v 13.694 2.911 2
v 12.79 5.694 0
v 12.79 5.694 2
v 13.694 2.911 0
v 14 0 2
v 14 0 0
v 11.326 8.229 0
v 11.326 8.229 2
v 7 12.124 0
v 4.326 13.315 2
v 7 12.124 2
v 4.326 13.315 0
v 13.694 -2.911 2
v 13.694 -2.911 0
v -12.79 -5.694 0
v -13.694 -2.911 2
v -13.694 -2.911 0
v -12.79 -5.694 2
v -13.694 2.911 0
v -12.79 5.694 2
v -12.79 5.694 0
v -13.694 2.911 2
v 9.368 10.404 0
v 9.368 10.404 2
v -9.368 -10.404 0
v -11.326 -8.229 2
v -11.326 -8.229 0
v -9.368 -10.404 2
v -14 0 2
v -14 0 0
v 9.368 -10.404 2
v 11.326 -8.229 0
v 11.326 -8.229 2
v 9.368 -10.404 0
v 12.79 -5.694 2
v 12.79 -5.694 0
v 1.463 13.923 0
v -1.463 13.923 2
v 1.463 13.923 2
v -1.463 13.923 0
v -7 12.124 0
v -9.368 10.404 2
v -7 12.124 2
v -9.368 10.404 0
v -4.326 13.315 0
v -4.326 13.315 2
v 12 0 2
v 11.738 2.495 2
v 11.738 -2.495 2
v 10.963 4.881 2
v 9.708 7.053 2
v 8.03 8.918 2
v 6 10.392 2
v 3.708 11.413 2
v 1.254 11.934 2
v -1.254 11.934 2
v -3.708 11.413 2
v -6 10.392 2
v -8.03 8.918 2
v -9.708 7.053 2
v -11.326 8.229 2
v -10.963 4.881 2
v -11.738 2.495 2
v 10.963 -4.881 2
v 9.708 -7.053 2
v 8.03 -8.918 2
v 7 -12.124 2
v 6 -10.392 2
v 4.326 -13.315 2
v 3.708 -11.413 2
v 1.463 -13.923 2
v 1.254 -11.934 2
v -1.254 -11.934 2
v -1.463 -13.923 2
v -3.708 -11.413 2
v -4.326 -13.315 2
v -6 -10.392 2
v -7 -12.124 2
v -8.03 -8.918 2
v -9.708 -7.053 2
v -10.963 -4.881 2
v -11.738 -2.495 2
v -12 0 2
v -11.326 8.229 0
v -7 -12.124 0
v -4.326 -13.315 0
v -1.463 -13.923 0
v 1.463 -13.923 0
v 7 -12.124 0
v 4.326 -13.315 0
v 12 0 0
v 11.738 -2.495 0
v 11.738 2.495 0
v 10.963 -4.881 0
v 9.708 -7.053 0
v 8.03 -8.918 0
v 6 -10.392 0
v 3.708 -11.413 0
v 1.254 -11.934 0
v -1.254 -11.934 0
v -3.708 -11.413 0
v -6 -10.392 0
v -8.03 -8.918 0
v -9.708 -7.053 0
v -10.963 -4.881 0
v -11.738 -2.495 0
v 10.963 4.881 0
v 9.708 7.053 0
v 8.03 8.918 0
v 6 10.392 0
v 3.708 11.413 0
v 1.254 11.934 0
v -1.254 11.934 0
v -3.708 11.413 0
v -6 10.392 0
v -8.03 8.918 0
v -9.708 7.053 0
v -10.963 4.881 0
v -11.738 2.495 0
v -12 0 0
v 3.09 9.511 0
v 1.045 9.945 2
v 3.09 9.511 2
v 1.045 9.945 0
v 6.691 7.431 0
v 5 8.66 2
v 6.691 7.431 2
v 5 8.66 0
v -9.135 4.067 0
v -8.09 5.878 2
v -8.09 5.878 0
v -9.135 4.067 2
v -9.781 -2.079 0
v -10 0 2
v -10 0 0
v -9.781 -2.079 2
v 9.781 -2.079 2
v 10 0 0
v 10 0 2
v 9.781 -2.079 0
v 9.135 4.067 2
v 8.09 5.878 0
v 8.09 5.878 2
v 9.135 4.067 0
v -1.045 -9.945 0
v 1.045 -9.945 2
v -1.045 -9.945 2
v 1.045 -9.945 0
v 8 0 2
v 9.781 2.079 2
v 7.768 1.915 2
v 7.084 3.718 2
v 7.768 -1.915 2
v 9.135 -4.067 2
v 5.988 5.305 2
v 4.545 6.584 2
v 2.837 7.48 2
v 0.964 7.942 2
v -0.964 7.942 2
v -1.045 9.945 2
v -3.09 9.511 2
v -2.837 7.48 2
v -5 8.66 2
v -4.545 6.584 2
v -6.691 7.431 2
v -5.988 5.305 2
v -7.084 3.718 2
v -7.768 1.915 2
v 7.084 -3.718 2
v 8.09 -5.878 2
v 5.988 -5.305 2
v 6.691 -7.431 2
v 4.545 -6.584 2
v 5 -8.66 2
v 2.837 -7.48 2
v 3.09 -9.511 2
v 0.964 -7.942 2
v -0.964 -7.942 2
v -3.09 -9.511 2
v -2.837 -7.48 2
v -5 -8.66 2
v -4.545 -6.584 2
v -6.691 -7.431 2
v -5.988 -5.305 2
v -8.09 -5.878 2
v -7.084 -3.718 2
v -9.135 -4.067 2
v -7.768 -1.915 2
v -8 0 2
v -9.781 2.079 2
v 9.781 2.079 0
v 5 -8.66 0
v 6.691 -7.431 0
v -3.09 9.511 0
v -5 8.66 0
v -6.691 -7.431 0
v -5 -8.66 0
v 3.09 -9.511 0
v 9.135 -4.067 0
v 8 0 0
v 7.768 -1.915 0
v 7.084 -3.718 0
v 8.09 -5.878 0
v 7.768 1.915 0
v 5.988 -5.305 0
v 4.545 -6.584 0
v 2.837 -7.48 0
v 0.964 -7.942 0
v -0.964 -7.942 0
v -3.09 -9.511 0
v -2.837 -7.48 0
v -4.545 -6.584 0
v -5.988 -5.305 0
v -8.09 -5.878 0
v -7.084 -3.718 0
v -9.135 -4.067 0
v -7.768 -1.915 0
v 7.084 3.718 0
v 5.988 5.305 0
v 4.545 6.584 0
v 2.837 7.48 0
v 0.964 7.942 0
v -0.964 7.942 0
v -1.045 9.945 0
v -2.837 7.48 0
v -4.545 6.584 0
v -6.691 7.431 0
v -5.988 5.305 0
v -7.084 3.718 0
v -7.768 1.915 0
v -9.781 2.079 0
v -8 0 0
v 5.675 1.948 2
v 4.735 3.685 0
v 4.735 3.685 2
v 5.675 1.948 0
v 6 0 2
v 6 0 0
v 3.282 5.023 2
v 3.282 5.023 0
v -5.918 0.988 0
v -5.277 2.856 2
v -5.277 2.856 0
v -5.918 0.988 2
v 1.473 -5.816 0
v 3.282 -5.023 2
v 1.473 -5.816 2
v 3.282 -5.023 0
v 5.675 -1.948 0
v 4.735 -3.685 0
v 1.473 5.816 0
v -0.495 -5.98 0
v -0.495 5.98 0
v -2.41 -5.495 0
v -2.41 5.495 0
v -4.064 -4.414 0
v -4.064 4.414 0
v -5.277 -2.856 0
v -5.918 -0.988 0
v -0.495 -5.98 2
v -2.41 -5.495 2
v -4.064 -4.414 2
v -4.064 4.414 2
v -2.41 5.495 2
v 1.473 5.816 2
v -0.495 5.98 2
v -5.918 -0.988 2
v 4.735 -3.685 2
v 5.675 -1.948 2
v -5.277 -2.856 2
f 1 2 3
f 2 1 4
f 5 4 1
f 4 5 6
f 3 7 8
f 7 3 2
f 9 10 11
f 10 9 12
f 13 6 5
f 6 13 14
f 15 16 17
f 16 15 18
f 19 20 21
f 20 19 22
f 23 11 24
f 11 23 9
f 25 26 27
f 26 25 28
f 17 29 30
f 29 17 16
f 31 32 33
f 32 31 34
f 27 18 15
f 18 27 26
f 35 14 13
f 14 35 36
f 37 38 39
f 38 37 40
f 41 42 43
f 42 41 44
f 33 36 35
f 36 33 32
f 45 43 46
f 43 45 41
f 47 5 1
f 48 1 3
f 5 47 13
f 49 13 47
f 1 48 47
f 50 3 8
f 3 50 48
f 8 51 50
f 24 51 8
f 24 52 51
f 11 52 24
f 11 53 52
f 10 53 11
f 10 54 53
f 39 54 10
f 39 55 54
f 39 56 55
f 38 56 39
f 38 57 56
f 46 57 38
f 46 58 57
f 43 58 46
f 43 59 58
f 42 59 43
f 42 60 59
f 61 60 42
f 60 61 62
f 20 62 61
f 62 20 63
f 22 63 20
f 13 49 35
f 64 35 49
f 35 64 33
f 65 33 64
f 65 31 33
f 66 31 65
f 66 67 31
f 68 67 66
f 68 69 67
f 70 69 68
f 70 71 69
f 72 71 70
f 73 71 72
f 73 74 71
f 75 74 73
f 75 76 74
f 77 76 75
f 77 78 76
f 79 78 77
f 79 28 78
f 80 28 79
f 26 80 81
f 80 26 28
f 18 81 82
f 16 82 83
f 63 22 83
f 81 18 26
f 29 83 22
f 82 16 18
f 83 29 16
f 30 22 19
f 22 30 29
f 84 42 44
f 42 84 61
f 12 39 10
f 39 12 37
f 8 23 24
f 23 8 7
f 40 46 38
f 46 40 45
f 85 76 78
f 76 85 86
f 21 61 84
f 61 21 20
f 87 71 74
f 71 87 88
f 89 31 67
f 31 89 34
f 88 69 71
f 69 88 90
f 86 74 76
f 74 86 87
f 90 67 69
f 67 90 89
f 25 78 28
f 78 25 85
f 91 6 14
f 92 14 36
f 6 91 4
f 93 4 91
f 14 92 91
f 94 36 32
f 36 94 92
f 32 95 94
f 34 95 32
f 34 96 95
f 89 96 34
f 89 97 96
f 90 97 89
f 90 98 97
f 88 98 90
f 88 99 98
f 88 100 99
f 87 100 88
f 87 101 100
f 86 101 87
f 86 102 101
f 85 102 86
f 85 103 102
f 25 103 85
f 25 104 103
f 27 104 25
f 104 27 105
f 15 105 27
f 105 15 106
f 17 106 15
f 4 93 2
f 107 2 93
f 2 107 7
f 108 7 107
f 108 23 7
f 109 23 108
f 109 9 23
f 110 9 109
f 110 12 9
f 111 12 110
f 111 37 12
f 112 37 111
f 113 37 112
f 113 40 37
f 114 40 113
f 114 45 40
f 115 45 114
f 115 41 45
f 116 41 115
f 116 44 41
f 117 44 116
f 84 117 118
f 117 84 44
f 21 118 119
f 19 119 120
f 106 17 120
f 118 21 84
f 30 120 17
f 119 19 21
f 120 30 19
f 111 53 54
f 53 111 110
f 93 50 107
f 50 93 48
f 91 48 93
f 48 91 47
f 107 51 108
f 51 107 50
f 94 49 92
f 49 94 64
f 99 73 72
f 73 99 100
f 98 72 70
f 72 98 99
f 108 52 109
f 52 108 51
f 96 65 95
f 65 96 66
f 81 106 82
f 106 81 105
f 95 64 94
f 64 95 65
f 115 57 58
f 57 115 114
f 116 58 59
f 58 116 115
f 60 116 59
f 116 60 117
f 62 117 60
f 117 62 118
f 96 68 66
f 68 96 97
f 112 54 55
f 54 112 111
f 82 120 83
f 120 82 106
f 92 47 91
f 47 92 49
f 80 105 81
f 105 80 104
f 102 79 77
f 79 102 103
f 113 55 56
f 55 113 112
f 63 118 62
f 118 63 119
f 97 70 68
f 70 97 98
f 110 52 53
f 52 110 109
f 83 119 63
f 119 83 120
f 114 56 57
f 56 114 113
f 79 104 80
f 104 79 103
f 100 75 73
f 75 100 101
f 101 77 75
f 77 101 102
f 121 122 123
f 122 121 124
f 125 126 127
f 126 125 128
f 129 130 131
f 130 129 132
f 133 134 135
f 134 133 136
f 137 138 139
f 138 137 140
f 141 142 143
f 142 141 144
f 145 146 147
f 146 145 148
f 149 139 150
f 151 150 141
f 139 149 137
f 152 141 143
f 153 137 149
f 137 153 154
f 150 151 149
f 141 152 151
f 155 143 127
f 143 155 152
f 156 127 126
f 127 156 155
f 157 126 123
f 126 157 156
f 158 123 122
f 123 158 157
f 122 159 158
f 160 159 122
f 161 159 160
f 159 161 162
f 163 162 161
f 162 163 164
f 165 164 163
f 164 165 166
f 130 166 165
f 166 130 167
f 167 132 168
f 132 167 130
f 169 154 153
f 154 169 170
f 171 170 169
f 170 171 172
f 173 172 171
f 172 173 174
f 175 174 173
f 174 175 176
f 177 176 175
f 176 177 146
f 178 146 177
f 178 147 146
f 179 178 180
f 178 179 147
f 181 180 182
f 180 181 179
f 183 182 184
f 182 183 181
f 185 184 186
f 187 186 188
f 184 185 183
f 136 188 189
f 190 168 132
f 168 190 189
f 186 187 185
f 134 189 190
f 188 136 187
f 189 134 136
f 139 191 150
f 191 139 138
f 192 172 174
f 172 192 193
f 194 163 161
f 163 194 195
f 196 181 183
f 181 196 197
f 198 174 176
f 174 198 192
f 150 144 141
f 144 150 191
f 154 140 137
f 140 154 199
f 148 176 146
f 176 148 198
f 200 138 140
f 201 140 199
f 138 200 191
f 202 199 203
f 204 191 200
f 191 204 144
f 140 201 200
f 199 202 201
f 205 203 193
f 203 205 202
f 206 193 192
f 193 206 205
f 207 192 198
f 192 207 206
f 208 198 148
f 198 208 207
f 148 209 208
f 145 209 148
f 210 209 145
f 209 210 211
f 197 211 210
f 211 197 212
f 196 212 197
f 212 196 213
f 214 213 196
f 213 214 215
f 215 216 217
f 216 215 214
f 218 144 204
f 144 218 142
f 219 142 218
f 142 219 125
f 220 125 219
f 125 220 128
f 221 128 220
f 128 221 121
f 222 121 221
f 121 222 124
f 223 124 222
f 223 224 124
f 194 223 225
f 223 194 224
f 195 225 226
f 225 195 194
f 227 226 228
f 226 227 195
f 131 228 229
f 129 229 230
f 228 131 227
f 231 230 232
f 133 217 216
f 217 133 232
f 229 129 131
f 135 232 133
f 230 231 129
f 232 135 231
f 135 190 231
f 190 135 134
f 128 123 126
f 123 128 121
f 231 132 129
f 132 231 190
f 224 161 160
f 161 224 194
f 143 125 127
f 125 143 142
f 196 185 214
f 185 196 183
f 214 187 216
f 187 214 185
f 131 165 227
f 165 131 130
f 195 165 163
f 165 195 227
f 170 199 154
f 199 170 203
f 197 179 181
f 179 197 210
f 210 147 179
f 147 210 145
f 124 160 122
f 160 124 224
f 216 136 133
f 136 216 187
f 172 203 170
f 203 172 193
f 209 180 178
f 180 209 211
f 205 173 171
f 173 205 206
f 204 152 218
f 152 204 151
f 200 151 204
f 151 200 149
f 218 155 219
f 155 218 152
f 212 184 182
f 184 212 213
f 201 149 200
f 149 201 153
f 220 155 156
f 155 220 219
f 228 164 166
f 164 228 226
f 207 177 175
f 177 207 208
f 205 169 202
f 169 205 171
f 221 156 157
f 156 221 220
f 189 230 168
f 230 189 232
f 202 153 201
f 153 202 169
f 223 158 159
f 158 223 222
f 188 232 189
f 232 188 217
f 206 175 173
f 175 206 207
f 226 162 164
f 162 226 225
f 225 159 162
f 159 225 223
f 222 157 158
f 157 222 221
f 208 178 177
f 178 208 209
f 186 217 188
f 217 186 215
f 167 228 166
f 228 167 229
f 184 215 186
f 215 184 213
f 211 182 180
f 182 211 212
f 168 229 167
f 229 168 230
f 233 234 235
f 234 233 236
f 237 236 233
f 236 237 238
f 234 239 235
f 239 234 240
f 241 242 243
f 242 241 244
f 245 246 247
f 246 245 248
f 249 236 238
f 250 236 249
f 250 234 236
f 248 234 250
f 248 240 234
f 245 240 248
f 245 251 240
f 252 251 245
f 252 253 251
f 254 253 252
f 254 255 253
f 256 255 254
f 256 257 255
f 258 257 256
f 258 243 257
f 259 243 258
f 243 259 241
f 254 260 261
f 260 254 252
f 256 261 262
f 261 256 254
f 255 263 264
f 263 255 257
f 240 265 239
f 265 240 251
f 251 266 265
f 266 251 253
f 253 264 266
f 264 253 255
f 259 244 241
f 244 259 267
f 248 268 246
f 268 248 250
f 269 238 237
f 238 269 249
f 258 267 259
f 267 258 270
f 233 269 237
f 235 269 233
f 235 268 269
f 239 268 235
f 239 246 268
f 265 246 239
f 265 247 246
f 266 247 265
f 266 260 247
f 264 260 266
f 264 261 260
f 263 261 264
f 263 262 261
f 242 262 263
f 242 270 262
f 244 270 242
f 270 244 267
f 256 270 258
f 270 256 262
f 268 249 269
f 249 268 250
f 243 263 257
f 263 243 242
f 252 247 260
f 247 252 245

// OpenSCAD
difference(){
 cylinder(h=2, r=14);
 cylinder(h=2, r=12);   
}

difference(){
 cylinder(h=2, r=10);
 cylinder(h=2, r=8);   
}
cylinder(h=2, r=6);   
